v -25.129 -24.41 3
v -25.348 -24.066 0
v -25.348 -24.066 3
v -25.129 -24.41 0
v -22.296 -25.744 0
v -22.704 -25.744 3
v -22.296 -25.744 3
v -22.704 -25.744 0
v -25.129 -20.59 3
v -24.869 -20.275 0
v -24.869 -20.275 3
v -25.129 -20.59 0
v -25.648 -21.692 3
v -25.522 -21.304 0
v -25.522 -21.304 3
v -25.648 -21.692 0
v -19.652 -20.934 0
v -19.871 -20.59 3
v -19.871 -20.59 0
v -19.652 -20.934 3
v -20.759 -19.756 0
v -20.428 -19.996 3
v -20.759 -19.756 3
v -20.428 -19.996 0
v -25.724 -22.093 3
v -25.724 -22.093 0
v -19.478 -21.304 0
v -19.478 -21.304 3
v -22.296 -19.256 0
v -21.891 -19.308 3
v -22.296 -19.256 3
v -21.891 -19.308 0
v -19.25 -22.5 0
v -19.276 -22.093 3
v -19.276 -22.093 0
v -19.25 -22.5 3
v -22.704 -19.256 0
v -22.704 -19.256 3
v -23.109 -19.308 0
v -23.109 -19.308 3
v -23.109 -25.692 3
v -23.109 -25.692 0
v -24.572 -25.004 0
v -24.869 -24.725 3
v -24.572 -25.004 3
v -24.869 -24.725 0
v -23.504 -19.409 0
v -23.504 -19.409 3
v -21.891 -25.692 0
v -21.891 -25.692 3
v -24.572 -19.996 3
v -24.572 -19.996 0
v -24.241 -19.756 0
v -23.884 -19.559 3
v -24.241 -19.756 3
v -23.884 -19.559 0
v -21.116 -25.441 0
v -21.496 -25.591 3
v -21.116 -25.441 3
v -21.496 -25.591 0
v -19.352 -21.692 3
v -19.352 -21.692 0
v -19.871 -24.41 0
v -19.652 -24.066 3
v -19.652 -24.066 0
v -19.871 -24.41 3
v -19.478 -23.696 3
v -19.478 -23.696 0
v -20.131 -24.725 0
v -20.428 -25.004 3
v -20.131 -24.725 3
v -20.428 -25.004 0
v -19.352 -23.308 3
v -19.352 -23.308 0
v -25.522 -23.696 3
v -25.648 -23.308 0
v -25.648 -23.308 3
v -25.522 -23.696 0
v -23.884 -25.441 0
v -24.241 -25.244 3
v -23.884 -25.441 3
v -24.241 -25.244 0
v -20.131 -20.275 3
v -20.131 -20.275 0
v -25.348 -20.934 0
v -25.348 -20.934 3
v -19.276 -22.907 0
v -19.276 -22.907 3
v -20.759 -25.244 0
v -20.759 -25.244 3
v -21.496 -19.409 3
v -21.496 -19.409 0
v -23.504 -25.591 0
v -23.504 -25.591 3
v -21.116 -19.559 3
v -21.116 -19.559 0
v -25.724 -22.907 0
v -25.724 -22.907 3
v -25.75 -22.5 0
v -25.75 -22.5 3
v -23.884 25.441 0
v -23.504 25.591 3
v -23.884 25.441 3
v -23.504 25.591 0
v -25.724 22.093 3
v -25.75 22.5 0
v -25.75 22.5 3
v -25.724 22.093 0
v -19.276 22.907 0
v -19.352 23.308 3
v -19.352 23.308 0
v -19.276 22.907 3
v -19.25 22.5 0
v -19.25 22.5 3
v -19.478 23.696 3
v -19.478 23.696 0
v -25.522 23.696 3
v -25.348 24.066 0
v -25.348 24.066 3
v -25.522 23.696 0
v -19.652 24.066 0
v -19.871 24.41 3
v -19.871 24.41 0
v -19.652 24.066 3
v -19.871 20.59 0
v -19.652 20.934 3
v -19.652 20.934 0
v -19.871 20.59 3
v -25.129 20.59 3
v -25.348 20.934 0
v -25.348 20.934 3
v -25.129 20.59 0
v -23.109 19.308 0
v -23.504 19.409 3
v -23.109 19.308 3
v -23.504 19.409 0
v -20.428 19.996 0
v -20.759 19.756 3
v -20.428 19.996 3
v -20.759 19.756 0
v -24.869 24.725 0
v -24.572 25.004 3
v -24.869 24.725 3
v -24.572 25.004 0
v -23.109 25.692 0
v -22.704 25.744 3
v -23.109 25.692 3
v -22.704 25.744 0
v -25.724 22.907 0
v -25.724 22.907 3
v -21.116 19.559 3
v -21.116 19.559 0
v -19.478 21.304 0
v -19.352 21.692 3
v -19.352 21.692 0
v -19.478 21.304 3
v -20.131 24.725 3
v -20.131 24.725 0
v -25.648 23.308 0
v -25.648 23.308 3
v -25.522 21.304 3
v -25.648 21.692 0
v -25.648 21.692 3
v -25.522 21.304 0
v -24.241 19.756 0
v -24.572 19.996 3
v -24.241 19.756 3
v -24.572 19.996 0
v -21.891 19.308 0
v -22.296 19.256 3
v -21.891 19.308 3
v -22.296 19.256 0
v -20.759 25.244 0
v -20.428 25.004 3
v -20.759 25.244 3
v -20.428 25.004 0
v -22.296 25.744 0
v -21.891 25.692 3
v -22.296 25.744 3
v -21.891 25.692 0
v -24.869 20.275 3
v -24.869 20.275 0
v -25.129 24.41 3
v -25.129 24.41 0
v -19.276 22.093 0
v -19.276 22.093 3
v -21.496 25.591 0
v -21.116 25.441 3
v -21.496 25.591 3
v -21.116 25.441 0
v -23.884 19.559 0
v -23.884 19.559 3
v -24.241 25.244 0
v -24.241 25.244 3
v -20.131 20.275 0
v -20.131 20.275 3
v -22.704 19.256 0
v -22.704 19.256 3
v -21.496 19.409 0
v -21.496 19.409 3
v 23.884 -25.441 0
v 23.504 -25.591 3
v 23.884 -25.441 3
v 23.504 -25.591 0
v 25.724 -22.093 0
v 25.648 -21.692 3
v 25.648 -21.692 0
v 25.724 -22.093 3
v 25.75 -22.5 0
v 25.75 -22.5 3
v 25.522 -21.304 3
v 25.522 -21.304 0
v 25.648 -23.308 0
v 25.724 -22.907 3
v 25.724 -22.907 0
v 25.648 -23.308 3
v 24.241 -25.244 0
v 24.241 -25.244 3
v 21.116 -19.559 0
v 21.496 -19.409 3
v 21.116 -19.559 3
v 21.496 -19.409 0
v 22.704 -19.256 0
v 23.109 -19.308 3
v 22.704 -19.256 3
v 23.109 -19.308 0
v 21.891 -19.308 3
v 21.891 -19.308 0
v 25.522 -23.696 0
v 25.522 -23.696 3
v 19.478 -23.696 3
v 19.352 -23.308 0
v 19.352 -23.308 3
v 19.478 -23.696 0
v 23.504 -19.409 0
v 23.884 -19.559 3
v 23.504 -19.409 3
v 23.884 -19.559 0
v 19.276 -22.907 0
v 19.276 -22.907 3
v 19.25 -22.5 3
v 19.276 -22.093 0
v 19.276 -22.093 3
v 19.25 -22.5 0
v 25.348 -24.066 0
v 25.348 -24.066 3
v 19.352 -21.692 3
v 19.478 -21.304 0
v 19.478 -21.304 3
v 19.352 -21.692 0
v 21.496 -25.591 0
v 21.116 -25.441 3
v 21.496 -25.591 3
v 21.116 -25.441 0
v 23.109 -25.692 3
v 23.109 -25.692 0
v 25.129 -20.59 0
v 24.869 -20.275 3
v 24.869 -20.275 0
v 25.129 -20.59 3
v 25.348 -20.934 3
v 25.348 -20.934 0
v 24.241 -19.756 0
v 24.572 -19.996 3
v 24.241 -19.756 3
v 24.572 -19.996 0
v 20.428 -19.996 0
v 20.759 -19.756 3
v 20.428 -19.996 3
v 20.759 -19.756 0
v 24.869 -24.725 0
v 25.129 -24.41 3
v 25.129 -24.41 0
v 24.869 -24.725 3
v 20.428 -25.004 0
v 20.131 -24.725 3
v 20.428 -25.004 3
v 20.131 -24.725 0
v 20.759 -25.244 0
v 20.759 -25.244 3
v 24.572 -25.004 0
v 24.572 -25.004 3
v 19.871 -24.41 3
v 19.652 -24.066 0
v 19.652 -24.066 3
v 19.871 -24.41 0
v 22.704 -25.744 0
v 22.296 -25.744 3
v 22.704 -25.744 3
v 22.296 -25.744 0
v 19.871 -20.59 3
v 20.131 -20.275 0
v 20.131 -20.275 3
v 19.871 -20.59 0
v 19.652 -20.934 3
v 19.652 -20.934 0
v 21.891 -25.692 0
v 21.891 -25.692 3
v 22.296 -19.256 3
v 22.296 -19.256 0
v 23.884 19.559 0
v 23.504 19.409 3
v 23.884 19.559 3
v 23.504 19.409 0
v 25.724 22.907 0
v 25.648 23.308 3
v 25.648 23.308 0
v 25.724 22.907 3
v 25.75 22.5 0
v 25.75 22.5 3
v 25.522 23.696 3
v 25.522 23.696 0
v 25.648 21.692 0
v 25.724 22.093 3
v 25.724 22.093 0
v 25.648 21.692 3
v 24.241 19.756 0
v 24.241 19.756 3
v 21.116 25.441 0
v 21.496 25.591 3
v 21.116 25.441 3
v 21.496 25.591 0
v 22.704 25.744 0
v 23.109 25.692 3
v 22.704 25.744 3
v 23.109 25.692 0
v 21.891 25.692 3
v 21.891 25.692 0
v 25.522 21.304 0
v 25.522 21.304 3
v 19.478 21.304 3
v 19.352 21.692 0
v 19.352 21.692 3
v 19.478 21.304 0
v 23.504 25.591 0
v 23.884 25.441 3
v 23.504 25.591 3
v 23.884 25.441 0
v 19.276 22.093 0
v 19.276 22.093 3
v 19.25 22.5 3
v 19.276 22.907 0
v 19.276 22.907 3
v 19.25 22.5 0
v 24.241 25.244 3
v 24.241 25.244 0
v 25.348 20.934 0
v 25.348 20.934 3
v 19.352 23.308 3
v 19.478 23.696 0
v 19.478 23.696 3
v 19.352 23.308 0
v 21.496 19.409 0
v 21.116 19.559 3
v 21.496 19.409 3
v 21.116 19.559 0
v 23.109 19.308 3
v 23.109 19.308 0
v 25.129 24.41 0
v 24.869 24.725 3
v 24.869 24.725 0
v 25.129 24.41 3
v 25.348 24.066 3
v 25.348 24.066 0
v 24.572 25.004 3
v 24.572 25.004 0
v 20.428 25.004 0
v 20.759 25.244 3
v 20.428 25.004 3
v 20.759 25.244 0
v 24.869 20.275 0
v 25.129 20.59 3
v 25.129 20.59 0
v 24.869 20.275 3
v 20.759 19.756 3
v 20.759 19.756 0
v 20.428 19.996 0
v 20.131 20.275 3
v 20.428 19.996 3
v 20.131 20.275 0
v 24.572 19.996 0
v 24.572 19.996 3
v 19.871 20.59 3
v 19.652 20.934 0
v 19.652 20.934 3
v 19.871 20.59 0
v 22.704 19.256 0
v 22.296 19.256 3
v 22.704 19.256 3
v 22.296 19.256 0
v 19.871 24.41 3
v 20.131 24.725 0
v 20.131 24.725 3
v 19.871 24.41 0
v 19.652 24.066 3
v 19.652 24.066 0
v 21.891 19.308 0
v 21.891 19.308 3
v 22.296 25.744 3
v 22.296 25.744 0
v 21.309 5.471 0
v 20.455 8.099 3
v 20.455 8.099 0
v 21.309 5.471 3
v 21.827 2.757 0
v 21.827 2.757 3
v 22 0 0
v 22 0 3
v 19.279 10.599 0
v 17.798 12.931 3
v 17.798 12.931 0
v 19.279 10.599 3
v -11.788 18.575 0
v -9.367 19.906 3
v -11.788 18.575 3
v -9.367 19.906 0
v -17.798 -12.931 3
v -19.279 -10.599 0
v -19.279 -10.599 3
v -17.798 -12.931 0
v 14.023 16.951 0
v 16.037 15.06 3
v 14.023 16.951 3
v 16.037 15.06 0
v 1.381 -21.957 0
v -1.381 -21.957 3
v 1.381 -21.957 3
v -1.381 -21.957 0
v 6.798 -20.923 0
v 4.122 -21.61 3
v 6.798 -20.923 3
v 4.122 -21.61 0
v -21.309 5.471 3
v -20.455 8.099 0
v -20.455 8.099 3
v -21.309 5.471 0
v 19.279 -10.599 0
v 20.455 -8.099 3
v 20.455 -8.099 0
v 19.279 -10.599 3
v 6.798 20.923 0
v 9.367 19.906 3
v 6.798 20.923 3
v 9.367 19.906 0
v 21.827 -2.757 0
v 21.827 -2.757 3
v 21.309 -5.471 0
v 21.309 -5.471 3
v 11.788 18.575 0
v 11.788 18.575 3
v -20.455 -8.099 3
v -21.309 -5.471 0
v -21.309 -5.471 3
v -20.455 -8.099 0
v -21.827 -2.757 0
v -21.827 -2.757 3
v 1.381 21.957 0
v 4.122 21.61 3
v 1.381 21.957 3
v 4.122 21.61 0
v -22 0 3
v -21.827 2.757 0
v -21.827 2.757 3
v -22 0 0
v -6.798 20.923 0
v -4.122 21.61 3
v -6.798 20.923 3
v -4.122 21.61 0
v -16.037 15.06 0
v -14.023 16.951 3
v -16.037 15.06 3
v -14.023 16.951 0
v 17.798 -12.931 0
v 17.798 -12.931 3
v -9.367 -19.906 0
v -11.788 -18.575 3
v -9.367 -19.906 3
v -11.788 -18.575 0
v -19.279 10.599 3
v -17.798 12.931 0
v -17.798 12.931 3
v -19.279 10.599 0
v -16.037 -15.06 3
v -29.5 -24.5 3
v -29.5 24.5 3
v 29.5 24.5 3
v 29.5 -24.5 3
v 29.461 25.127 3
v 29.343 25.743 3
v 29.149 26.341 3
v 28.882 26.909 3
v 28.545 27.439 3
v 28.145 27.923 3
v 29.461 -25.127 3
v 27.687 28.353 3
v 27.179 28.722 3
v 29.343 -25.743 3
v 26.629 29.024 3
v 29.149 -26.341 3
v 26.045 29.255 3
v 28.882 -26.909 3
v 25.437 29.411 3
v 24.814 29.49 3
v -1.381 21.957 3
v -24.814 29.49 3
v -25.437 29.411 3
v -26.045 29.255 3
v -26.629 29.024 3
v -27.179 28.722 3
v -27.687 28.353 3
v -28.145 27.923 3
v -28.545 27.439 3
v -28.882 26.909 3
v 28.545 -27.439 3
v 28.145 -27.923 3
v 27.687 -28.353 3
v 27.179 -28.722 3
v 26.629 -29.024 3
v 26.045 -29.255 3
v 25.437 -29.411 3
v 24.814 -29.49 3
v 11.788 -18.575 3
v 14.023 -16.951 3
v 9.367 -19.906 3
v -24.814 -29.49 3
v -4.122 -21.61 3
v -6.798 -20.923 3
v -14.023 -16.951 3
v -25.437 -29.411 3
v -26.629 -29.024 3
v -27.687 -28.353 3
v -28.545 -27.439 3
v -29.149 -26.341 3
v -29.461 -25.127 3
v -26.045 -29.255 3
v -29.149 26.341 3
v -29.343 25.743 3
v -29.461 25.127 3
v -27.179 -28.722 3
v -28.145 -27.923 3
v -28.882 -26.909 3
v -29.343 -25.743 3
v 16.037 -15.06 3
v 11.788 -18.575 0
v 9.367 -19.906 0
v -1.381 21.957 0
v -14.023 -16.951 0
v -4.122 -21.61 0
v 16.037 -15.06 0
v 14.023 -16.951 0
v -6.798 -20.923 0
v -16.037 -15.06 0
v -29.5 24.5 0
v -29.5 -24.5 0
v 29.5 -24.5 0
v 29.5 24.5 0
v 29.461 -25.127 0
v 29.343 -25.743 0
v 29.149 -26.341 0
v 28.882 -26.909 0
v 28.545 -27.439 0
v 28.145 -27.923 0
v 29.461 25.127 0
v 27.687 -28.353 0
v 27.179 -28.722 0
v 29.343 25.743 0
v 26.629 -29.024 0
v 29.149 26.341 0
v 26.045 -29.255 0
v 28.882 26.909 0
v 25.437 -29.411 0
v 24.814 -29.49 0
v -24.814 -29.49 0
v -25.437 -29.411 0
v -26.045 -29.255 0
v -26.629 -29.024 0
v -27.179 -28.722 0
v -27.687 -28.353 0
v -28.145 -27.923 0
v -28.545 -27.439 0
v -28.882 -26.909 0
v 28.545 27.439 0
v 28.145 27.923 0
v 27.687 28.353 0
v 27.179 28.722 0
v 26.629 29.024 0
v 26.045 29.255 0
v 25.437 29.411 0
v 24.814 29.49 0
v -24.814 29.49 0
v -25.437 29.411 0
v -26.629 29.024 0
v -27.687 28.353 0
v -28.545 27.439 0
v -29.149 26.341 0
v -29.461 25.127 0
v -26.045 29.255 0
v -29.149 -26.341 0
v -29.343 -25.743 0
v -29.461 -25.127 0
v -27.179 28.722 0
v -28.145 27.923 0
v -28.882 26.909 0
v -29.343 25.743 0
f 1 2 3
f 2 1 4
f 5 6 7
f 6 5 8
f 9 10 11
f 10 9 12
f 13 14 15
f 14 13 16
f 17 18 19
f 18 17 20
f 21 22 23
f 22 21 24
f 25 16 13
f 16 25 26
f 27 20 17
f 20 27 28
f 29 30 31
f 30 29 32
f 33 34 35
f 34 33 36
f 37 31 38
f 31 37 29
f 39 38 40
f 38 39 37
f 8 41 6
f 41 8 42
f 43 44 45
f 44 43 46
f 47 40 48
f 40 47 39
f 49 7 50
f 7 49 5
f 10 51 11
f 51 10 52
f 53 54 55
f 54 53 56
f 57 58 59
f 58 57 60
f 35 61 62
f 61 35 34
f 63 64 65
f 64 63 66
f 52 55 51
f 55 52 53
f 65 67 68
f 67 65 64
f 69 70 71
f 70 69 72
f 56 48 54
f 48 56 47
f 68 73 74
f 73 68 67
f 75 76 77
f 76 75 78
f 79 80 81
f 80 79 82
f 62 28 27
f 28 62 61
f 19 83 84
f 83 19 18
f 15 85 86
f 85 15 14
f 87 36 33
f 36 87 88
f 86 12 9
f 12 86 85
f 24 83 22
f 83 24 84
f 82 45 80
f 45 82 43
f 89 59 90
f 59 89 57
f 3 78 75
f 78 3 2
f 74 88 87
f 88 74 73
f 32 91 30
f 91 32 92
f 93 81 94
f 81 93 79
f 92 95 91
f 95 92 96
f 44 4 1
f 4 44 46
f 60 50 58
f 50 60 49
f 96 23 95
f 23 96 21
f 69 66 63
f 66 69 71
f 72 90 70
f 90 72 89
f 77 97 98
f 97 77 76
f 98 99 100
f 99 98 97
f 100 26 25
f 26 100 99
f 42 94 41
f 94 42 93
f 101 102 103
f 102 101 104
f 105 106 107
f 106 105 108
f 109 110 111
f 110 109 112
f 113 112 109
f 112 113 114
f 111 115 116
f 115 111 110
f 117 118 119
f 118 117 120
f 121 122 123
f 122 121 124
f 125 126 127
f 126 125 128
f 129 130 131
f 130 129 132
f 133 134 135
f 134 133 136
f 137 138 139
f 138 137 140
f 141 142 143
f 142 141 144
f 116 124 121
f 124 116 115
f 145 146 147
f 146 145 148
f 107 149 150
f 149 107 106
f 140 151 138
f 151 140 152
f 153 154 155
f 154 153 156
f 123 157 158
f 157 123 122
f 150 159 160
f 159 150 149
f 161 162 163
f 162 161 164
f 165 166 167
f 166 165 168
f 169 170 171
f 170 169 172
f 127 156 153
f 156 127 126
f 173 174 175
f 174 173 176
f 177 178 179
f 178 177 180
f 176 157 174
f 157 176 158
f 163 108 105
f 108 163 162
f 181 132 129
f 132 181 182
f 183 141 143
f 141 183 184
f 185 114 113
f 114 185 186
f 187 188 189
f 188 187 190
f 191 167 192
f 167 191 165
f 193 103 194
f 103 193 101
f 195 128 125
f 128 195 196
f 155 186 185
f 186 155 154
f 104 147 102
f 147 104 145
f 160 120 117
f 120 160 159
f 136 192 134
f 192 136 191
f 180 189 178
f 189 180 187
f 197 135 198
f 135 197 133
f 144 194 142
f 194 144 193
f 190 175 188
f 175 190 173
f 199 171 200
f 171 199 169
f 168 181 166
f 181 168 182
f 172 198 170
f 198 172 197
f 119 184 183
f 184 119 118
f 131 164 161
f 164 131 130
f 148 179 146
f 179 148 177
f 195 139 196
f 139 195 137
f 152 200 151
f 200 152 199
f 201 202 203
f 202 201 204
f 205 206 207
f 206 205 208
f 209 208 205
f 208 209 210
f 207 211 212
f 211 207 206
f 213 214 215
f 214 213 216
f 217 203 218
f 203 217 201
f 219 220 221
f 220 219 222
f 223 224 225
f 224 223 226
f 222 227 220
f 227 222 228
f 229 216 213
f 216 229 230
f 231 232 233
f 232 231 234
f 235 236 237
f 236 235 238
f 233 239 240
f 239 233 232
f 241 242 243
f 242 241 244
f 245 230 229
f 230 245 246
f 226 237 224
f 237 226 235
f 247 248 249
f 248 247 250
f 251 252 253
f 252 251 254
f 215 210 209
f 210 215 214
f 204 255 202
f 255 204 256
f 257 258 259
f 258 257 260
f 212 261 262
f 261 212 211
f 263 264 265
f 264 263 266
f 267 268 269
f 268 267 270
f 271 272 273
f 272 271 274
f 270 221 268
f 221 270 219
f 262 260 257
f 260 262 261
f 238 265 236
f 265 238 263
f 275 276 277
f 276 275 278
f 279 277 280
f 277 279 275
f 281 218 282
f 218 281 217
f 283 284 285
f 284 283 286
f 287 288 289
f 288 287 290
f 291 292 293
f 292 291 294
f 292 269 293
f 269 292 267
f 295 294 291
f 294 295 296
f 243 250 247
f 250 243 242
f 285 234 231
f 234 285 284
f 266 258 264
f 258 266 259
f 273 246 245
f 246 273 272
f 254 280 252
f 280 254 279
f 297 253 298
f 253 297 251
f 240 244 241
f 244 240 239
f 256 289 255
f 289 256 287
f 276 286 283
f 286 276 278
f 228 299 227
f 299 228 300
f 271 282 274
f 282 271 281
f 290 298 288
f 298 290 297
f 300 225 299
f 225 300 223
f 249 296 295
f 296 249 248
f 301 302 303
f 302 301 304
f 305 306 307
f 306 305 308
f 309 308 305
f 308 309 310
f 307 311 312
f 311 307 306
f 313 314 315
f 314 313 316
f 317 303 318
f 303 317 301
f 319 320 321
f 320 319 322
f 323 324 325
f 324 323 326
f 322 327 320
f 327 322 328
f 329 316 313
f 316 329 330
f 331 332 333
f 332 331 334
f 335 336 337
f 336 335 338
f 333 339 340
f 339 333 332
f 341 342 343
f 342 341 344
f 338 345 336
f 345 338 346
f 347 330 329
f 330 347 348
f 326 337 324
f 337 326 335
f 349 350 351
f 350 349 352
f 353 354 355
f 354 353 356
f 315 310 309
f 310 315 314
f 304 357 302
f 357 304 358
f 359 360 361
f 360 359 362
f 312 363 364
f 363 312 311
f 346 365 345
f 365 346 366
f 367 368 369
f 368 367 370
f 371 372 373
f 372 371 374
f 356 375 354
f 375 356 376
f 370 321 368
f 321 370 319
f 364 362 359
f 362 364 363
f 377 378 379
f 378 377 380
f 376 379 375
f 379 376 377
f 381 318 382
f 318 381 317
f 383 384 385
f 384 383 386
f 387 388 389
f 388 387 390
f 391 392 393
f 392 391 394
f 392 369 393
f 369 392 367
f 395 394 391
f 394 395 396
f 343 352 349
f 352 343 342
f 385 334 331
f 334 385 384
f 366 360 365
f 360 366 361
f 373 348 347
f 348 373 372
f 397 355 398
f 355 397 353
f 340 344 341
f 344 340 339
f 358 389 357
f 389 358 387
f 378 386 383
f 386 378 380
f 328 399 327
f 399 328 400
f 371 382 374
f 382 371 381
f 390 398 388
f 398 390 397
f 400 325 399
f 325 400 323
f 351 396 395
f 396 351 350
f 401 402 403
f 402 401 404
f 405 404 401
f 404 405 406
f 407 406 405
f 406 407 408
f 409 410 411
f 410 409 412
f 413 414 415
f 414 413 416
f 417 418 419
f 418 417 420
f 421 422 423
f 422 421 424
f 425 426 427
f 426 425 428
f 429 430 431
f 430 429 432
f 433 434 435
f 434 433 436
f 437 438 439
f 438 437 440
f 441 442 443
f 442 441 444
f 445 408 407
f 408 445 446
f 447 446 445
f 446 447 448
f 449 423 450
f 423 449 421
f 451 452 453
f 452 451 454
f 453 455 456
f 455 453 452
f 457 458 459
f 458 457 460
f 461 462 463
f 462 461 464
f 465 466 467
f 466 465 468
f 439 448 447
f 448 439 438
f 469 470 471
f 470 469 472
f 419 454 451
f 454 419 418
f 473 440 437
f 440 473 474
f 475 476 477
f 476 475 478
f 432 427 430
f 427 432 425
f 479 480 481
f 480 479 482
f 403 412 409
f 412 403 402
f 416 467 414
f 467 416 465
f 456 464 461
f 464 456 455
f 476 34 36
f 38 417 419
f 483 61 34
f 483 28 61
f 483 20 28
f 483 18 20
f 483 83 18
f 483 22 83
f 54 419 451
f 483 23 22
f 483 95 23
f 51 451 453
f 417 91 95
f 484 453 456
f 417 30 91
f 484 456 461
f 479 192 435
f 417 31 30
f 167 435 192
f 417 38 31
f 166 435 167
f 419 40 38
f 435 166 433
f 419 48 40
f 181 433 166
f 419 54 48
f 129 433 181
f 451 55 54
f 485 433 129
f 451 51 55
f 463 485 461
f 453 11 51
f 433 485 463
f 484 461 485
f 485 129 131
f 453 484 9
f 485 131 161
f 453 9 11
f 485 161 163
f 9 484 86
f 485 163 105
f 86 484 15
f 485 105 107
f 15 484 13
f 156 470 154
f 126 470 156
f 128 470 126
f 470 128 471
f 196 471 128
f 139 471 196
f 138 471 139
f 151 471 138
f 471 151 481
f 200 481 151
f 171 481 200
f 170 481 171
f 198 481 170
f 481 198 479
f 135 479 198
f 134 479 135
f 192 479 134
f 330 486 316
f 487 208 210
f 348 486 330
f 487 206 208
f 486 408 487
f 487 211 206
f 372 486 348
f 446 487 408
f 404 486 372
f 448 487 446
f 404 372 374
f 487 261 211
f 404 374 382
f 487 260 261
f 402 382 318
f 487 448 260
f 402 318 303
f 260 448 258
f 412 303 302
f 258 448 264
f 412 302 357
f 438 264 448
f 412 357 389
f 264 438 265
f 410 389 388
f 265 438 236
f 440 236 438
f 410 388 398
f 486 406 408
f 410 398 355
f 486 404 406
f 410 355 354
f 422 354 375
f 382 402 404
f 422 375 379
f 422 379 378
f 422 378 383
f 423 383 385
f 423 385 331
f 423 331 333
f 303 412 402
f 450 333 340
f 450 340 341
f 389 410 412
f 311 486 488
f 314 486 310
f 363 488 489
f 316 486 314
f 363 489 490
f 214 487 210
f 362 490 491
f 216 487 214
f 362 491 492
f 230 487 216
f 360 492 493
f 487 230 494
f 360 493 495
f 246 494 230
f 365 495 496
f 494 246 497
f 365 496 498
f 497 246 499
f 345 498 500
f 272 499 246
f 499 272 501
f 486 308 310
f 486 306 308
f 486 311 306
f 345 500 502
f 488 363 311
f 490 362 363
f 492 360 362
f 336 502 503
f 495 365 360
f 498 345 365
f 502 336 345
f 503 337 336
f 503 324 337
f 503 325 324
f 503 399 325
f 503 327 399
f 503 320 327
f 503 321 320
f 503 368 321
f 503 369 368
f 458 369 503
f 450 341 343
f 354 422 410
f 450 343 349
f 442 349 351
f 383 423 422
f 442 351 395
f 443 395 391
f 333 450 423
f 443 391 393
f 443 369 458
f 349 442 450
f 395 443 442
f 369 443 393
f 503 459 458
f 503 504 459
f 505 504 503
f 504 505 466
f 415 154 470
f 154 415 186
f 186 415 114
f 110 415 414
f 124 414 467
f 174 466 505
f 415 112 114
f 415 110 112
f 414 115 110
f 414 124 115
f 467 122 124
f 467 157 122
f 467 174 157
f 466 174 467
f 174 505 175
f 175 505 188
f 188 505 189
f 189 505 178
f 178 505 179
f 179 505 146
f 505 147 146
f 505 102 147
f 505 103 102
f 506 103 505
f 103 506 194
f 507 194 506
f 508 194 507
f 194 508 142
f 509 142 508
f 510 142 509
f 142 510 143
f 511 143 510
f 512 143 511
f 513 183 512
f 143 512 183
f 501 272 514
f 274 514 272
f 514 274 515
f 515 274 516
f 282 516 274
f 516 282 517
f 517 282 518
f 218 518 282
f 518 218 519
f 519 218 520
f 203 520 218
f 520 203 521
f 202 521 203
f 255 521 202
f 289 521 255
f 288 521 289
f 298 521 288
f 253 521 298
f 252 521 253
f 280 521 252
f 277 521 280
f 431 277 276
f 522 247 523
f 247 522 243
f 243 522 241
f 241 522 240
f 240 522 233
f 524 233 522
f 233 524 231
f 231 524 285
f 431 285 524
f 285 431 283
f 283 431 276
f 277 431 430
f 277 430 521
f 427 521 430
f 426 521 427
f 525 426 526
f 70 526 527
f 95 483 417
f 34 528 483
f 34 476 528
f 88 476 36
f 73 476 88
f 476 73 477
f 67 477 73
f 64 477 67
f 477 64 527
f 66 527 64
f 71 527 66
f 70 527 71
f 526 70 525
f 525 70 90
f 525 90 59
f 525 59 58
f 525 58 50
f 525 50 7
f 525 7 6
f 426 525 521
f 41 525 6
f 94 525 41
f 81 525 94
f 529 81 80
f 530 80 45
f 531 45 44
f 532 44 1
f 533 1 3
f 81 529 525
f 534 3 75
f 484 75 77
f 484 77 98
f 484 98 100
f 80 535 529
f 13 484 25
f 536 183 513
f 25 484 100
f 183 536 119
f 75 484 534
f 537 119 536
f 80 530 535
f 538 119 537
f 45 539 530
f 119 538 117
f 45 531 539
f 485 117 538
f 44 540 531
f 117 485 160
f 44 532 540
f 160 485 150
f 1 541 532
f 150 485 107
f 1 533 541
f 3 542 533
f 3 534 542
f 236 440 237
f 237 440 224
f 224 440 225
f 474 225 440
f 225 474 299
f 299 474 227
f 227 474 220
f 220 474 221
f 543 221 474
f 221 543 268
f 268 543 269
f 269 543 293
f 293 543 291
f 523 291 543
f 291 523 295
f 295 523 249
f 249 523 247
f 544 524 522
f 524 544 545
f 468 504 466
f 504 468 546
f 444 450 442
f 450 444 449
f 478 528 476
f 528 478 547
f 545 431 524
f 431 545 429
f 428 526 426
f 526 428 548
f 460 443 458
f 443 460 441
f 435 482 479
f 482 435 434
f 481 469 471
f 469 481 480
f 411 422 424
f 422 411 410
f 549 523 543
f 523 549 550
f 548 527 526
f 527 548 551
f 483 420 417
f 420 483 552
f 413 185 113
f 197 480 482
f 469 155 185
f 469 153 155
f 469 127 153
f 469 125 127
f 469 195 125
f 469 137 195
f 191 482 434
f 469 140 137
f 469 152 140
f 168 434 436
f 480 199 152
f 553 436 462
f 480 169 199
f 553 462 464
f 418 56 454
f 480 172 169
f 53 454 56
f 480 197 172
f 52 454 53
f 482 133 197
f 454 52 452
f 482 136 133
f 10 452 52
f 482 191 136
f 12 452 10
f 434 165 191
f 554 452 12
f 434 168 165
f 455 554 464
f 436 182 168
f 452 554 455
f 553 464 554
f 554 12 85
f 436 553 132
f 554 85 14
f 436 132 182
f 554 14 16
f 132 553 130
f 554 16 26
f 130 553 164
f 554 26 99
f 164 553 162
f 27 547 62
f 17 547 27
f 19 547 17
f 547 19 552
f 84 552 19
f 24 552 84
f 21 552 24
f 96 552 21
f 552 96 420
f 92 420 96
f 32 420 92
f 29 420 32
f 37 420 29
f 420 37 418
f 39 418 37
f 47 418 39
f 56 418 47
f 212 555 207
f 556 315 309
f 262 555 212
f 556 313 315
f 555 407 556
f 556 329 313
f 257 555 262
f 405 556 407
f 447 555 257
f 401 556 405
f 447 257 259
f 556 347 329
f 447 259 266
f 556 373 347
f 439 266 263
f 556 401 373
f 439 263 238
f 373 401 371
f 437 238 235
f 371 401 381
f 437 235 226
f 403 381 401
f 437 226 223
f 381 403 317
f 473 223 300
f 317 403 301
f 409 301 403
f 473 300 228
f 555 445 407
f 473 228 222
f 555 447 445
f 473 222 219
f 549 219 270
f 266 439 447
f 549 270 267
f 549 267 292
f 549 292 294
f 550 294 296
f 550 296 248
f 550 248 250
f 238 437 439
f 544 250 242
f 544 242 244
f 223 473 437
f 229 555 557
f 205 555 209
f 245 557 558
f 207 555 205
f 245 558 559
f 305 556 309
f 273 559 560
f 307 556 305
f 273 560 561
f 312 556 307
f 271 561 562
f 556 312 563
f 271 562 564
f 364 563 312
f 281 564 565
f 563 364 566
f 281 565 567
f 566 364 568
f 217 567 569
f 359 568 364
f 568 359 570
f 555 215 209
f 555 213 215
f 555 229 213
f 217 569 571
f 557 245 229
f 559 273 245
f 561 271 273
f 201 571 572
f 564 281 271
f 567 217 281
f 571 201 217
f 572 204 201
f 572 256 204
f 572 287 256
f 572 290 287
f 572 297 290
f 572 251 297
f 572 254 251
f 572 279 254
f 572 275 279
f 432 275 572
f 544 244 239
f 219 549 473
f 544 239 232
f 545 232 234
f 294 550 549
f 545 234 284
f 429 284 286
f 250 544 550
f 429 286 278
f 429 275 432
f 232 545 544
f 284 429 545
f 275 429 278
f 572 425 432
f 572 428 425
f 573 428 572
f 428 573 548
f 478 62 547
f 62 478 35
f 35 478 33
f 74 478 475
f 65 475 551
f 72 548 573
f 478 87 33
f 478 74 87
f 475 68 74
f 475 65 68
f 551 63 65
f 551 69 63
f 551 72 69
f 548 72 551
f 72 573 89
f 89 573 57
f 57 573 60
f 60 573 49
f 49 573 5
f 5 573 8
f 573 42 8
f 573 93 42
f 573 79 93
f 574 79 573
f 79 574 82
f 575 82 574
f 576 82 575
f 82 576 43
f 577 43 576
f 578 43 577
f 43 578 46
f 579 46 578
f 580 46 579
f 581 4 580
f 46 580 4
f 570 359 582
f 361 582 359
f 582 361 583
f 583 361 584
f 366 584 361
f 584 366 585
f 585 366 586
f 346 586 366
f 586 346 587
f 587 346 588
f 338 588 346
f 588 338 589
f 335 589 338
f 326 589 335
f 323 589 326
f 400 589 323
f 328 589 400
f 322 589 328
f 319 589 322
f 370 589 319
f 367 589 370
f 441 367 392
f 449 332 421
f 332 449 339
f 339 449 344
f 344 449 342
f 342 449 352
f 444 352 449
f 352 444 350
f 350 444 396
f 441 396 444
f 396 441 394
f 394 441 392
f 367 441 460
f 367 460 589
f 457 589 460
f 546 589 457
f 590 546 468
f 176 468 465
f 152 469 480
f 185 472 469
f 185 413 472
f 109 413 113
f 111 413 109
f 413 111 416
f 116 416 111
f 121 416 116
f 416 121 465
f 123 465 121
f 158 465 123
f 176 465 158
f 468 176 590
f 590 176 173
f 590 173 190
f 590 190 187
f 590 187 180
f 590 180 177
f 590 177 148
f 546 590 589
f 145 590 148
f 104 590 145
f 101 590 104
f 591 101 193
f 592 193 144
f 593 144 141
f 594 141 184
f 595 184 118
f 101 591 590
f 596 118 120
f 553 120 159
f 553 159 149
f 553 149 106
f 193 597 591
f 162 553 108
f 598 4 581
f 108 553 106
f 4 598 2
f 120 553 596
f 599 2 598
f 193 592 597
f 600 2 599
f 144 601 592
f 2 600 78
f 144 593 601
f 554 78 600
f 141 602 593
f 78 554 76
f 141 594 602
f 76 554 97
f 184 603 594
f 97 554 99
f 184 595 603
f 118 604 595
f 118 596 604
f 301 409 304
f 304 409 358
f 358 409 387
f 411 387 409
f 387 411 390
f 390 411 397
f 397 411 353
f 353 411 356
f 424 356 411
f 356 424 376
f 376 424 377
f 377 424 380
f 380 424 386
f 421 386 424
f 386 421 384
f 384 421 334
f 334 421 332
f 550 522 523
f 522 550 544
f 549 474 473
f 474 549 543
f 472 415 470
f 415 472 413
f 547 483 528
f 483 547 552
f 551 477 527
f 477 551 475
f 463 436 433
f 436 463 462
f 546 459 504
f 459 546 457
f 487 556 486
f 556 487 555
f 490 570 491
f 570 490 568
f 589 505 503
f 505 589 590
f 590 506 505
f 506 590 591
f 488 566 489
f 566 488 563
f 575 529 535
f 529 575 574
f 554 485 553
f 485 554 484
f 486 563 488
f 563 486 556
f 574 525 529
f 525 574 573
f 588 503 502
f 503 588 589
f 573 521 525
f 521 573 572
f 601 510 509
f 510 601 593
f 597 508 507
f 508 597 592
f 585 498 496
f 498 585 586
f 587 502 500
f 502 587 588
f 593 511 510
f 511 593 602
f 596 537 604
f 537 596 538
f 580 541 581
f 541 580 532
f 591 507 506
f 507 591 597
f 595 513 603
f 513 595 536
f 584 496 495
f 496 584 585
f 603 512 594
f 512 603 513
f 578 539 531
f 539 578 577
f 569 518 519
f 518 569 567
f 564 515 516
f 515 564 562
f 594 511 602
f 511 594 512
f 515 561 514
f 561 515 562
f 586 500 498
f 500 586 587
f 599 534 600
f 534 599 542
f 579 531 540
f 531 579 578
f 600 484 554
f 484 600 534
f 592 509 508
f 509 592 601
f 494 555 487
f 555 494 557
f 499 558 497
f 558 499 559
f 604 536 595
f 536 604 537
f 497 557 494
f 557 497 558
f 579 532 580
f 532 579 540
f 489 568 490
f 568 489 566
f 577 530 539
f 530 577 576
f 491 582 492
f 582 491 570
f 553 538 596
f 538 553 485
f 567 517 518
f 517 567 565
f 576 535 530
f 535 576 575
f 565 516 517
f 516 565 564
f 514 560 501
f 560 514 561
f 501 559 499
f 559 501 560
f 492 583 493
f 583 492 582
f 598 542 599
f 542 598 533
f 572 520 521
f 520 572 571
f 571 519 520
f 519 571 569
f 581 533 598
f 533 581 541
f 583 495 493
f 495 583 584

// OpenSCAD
$fn = 50;


difference() {
	union() {
		hull() {
			translate(v = [-24.5000000000, 24.5000000000, 0]) {
				cylinder(h = 3, r = 5);
			}
			translate(v = [24.5000000000, 24.5000000000, 0]) {
				cylinder(h = 3, r = 5);
			}
			translate(v = [-24.5000000000, -24.5000000000, 0]) {
				cylinder(h = 3, r = 5);
			}
			translate(v = [24.5000000000, -24.5000000000, 0]) {
				cylinder(h = 3, r = 5);
			}
		}
	}
	union() {
		#translate(v = [-22.5000000000, -22.5000000000, -100.0000000000]) {
			cylinder(h = 200, r = 3.2500000000);
		}
		#translate(v = [-22.5000000000, 22.5000000000, -100.0000000000]) {
			cylinder(h = 200, r = 3.2500000000);
		}
		#translate(v = [22.5000000000, -22.5000000000, -100.0000000000]) {
			cylinder(h = 200, r = 3.2500000000);
		}
		#translate(v = [22.5000000000, 22.5000000000, -100.0000000000]) {
			cylinder(h = 200, r = 3.2500000000);
		}
		#cylinder(h = 3, r = 22.0000000000);
	}
}
